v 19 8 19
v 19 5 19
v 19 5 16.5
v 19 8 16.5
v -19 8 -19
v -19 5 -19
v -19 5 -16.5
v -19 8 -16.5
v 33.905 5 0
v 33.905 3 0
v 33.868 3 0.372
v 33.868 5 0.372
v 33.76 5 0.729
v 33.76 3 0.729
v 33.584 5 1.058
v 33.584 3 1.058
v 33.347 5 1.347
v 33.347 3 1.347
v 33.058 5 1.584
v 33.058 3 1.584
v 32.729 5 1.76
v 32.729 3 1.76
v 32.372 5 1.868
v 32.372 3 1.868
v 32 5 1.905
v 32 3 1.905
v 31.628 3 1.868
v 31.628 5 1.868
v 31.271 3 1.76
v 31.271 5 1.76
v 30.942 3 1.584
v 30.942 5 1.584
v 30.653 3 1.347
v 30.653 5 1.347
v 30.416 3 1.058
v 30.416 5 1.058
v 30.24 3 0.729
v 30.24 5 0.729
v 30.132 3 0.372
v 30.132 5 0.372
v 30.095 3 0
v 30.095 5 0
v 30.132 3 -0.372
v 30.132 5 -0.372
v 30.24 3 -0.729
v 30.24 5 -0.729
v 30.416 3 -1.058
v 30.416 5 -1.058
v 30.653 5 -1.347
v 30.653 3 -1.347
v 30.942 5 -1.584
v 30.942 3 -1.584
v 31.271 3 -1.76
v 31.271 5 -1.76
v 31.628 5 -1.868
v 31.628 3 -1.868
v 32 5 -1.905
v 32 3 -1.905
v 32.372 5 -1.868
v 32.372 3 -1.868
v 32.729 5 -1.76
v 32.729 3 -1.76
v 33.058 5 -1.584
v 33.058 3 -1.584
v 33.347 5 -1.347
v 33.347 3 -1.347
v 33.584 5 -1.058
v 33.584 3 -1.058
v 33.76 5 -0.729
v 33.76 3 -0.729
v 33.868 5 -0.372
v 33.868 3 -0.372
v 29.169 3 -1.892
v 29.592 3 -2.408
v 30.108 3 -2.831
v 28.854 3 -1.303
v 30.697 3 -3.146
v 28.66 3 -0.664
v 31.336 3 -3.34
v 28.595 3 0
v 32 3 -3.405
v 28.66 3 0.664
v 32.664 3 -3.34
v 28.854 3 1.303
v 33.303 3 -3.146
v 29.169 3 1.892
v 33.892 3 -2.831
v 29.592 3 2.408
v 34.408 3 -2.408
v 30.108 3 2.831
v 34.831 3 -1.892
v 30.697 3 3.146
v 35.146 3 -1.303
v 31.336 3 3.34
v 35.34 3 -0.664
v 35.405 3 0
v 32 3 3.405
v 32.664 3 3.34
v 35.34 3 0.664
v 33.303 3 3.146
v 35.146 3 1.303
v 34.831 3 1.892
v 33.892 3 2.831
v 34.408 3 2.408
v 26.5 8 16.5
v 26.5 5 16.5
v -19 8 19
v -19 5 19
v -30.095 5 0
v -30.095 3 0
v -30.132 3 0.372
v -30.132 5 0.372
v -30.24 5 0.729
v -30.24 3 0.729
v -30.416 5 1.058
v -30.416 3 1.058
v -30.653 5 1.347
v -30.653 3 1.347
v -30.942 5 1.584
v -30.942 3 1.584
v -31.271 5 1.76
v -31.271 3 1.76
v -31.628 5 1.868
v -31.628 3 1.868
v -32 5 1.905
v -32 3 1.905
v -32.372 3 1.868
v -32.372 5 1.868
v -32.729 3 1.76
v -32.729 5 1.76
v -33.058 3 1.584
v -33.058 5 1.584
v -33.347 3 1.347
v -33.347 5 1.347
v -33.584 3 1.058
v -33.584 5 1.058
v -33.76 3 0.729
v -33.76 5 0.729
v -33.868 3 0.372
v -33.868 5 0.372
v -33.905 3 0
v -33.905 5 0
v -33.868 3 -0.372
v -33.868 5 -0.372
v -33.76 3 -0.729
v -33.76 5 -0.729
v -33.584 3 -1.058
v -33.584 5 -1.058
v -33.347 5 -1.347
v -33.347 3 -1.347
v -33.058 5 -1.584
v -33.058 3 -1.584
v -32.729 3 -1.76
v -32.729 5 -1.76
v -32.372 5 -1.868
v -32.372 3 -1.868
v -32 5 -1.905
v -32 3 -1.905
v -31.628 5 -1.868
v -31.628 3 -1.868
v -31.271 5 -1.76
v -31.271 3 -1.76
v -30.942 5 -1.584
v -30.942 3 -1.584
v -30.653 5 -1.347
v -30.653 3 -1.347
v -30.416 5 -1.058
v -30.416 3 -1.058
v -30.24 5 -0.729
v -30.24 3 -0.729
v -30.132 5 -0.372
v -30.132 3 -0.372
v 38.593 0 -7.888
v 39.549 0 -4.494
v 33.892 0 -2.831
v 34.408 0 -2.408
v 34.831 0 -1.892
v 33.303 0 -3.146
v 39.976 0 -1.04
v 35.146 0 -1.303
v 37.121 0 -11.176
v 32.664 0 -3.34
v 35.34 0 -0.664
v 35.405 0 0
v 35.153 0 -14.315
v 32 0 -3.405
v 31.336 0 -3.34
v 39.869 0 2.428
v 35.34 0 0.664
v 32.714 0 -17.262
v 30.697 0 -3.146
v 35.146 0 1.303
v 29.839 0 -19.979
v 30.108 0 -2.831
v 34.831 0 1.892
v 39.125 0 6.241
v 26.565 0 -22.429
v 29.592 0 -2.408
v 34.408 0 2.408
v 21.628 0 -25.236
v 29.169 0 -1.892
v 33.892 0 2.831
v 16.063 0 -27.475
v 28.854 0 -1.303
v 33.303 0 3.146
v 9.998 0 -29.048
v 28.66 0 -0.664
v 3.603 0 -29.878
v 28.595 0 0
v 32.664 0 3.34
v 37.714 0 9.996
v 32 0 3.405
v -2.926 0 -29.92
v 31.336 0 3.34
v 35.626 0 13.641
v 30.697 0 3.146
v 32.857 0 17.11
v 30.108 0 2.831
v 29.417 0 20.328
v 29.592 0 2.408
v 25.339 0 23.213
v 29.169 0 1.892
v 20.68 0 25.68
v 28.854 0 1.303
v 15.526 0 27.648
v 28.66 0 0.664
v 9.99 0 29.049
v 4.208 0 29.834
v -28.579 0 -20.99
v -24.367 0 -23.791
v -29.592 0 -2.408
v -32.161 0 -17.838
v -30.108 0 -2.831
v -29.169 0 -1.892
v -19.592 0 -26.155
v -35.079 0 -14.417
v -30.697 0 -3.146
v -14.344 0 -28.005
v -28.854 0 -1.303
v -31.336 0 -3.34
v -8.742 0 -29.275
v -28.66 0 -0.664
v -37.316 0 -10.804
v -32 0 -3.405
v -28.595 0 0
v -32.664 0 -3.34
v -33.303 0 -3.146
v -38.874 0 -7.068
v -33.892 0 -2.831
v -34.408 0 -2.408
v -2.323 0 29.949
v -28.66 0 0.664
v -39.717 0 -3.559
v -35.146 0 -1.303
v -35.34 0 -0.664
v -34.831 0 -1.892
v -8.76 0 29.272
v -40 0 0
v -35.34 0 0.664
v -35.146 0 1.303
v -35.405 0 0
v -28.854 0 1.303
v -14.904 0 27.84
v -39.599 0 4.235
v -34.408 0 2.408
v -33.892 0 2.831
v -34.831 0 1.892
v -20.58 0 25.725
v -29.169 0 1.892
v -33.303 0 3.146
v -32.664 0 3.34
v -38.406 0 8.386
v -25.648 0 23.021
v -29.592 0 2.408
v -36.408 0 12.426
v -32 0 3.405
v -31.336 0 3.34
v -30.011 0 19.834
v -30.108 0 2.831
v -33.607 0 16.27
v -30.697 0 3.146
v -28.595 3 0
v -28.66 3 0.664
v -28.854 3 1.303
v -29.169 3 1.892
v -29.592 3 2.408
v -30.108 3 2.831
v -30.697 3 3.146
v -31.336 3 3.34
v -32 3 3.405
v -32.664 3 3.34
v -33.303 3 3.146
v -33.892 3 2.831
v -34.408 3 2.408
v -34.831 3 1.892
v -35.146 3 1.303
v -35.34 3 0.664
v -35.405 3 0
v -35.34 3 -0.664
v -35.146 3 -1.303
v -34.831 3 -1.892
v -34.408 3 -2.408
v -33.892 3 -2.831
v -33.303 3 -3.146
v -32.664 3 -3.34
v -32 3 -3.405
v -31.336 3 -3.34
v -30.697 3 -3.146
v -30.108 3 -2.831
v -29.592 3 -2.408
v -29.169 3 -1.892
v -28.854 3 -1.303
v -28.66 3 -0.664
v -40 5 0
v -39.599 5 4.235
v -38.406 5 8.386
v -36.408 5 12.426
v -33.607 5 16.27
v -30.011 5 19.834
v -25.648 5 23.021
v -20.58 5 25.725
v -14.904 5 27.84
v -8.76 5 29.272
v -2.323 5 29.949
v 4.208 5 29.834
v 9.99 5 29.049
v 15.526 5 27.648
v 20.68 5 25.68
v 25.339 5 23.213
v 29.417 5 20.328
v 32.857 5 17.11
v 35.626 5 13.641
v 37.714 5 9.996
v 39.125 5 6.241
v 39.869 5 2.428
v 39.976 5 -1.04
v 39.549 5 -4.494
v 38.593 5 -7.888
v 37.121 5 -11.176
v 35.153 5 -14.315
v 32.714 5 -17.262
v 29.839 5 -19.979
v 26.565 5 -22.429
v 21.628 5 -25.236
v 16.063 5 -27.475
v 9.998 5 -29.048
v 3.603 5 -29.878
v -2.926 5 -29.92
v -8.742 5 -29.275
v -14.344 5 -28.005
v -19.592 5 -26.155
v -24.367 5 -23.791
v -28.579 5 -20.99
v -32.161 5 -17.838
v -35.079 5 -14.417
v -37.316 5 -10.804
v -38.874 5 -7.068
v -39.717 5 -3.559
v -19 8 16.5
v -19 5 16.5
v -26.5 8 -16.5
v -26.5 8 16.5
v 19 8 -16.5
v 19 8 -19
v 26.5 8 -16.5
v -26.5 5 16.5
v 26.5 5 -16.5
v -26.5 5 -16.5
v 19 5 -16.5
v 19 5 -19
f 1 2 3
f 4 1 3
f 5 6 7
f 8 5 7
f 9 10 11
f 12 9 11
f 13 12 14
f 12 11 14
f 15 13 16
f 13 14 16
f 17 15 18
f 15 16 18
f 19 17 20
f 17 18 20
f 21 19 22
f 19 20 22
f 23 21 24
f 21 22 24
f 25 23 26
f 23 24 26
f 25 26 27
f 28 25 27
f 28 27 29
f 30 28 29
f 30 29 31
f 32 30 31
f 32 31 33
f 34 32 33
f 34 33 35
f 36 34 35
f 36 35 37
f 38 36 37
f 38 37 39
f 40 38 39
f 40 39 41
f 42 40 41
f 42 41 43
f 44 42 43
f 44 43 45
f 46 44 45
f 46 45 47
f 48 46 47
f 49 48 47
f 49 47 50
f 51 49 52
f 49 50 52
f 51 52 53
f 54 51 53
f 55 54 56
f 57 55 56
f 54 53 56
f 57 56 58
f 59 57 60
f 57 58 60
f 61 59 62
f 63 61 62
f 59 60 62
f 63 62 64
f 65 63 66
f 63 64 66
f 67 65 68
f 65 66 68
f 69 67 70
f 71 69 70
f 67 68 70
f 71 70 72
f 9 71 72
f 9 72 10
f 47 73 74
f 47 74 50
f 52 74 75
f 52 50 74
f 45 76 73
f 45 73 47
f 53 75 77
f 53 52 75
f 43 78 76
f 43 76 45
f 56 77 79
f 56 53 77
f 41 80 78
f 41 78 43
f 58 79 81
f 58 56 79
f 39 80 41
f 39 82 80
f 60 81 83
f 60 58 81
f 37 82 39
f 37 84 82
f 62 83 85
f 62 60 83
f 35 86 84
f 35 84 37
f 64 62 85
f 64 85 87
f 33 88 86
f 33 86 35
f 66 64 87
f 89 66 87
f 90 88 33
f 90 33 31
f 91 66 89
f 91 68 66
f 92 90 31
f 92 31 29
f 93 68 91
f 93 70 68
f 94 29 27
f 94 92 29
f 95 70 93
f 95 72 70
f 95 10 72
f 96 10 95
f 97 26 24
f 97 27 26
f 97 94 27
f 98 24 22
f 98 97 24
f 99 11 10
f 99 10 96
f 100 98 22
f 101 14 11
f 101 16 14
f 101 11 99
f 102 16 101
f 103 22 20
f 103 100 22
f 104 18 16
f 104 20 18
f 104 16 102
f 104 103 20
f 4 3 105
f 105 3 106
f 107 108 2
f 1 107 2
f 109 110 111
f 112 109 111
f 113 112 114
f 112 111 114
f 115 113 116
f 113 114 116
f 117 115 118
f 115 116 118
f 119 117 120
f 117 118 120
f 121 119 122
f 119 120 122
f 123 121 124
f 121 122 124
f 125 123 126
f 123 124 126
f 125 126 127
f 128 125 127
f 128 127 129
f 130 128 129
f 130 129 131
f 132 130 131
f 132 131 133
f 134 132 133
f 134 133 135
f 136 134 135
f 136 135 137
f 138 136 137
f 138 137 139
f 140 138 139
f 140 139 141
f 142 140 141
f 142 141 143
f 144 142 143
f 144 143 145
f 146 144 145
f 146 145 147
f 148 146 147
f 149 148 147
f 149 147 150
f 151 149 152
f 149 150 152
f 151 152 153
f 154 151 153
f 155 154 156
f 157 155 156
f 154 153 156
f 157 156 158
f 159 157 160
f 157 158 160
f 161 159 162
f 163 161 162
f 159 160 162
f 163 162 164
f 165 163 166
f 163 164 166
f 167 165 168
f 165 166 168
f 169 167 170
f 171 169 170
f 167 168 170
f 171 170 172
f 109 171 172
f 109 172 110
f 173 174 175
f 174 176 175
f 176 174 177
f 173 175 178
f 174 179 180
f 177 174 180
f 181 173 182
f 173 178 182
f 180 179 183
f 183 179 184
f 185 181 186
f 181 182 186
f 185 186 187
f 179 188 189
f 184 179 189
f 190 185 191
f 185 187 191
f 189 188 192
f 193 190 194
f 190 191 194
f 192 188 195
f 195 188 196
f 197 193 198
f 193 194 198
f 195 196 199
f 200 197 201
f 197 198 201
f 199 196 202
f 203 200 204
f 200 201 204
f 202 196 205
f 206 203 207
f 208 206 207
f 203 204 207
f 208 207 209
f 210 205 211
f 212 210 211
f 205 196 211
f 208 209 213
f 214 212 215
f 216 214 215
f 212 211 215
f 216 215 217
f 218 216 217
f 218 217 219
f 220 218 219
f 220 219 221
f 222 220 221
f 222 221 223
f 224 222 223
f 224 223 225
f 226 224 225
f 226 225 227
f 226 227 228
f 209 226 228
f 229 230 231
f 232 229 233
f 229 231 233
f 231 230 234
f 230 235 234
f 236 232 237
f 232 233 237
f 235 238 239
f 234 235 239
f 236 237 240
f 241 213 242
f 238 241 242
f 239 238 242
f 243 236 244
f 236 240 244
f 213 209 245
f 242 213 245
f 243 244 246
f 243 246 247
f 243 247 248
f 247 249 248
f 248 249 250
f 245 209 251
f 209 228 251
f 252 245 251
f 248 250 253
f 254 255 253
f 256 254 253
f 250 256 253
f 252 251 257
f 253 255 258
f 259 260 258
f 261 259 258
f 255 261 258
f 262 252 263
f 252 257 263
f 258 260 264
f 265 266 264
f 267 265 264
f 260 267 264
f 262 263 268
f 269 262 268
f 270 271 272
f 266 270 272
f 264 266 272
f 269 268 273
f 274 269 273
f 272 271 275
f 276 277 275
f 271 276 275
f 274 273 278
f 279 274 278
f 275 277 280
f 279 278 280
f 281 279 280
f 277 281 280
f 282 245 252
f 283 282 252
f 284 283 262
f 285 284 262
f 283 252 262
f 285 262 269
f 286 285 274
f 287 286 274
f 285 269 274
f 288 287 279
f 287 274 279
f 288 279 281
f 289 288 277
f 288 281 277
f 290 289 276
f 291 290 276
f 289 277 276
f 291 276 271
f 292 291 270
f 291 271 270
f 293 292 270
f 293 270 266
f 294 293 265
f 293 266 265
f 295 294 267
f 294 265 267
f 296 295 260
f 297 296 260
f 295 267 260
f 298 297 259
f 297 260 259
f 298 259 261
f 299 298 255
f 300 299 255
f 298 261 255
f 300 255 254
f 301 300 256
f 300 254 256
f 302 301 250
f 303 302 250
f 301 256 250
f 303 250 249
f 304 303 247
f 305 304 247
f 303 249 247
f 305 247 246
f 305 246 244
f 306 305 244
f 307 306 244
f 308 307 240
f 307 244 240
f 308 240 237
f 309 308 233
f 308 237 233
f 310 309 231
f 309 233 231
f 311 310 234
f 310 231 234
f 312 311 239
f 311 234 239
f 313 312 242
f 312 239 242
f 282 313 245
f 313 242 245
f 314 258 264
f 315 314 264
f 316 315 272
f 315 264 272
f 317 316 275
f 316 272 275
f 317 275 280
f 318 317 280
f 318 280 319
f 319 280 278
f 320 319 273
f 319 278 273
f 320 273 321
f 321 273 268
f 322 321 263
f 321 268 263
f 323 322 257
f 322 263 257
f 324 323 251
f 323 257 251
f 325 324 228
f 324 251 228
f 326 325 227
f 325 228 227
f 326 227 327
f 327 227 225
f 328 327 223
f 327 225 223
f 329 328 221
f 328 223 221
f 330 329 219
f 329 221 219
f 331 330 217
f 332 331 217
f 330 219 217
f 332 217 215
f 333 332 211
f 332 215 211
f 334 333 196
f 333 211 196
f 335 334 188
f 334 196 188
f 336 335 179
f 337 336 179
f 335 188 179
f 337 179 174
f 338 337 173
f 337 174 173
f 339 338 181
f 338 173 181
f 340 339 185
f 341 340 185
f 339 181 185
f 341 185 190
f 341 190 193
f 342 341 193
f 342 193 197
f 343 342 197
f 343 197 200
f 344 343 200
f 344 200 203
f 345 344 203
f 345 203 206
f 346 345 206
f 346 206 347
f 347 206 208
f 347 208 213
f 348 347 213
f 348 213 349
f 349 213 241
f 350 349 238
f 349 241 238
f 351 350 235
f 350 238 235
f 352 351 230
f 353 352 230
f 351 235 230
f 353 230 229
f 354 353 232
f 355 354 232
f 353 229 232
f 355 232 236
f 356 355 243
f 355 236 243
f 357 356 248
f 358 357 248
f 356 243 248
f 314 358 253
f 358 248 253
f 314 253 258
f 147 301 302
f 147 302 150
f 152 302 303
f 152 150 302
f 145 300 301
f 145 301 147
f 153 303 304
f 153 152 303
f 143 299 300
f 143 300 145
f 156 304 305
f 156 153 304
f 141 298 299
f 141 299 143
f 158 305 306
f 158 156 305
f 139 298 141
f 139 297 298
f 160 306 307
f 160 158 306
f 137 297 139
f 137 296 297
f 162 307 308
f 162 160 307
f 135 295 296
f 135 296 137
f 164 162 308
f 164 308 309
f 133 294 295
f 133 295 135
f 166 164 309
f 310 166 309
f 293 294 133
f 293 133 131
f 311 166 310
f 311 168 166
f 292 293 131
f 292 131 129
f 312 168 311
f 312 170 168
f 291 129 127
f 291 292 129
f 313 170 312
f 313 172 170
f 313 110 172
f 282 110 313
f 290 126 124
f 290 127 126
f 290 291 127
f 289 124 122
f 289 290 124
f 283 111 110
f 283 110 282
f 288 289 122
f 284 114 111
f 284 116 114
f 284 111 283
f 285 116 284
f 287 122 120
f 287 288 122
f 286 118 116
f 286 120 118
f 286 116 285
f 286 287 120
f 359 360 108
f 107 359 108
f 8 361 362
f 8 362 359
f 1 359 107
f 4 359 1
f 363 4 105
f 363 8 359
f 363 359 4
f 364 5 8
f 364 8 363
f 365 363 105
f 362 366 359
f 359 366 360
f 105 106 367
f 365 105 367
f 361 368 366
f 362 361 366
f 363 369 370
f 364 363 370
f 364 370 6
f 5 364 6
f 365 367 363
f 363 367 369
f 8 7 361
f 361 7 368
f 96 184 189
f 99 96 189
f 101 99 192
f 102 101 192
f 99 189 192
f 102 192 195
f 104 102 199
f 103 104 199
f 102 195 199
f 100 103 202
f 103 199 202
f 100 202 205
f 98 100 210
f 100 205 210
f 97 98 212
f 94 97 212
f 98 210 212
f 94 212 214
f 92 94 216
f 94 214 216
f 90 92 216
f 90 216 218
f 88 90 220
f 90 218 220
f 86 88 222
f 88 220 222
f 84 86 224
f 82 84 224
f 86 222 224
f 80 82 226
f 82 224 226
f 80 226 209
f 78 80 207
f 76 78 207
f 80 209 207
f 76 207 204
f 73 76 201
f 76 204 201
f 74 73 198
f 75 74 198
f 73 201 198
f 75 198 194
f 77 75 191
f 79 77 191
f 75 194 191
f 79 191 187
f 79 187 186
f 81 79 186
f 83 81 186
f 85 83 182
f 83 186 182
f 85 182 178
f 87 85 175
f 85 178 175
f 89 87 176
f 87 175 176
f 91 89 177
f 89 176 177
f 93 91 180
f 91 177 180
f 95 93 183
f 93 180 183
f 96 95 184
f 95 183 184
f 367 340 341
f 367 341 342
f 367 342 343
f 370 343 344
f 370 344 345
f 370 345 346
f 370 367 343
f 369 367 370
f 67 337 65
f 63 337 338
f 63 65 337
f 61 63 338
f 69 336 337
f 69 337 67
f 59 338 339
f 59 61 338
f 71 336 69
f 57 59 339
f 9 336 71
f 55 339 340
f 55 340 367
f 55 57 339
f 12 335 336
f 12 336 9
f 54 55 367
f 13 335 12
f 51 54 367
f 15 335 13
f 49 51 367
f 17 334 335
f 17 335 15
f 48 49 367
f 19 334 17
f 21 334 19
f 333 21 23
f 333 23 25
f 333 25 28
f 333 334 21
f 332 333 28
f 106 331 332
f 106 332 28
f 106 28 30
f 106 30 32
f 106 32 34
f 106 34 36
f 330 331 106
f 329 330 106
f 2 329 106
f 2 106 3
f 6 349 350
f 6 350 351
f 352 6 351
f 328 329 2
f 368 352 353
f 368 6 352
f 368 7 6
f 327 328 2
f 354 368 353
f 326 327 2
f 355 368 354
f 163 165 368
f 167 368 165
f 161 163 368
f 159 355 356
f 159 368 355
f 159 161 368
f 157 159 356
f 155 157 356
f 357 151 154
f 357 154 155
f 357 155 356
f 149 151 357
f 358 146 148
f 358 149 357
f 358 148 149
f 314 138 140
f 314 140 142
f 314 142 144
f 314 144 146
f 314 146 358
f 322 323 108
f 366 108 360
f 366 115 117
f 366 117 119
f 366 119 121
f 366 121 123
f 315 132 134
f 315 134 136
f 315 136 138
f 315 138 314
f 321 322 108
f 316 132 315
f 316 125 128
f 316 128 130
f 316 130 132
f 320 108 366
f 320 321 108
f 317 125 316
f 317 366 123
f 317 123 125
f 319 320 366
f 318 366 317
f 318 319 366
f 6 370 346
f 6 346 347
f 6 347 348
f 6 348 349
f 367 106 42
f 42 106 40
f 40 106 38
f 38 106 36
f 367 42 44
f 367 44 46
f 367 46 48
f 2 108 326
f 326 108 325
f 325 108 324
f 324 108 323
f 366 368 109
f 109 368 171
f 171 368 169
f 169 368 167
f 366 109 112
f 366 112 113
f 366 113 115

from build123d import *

# Parameters (mm, degrees)
SKETCH1_RX          = 40
SKETCH1_RY          = 30
BOSS_EXTRUDE1_DEPTH = 5
BOSS_EXTRUDE2_DEPTH = 3
SKETCH3_R           = 1.905
CUT_EXTRUDE1_DEPTH  = 10
SKETCH4_R           = 3.405
CUT_EXTRUDE2_DEPTH  = 3


with BuildPart() as part:
    # Sketch1 → Boss-Extrude1 (new body)
    with BuildSketch(Plane(origin=(0, 0, 0), x_dir=(1, 0, 0), z_dir=(0, 1, 0))):
        with Locations(Location((0, 0), (0, 0, 180))):
            Ellipse(SKETCH1_RX, SKETCH1_RY)
    extrude(amount=BOSS_EXTRUDE1_DEPTH)

    # Sketch2 → Boss-Extrude2 (add)
    with BuildSketch(Plane(origin=(0, 5, 0), x_dir=(1, 0, 0), z_dir=(0, 1, 0))):
        Polygon((-19, 16.5), (-26.5, 16.5), (-26.5, -16.5), (-19, -16.5), (-19, -19), (19, -19), (19, -16.5), (26.5, -16.5), (26.5, 16.5), (19, 16.5), (19, 19), (-19, 19), align=None)
    extrude(amount=BOSS_EXTRUDE2_DEPTH)

    # Sketch3 → Cut-Extrude1 (cut)
    with BuildSketch(Plane.XZ):
        with Locations((32, 0)):
            Circle(SKETCH3_R)
        with Locations((-32, 0)):
            Circle(SKETCH3_R)
    extrude(amount=-CUT_EXTRUDE1_DEPTH, mode=Mode.SUBTRACT)

    # Sketch4 → Cut-Extrude2 (cut)
    with BuildSketch(Plane.XZ):
        with Locations((-32, 0)):
            Circle(SKETCH4_R)
        with Locations((32, 0)):
            Circle(SKETCH4_R)
    extrude(amount=-CUT_EXTRUDE2_DEPTH, mode=Mode.SUBTRACT)


solid = part.part
